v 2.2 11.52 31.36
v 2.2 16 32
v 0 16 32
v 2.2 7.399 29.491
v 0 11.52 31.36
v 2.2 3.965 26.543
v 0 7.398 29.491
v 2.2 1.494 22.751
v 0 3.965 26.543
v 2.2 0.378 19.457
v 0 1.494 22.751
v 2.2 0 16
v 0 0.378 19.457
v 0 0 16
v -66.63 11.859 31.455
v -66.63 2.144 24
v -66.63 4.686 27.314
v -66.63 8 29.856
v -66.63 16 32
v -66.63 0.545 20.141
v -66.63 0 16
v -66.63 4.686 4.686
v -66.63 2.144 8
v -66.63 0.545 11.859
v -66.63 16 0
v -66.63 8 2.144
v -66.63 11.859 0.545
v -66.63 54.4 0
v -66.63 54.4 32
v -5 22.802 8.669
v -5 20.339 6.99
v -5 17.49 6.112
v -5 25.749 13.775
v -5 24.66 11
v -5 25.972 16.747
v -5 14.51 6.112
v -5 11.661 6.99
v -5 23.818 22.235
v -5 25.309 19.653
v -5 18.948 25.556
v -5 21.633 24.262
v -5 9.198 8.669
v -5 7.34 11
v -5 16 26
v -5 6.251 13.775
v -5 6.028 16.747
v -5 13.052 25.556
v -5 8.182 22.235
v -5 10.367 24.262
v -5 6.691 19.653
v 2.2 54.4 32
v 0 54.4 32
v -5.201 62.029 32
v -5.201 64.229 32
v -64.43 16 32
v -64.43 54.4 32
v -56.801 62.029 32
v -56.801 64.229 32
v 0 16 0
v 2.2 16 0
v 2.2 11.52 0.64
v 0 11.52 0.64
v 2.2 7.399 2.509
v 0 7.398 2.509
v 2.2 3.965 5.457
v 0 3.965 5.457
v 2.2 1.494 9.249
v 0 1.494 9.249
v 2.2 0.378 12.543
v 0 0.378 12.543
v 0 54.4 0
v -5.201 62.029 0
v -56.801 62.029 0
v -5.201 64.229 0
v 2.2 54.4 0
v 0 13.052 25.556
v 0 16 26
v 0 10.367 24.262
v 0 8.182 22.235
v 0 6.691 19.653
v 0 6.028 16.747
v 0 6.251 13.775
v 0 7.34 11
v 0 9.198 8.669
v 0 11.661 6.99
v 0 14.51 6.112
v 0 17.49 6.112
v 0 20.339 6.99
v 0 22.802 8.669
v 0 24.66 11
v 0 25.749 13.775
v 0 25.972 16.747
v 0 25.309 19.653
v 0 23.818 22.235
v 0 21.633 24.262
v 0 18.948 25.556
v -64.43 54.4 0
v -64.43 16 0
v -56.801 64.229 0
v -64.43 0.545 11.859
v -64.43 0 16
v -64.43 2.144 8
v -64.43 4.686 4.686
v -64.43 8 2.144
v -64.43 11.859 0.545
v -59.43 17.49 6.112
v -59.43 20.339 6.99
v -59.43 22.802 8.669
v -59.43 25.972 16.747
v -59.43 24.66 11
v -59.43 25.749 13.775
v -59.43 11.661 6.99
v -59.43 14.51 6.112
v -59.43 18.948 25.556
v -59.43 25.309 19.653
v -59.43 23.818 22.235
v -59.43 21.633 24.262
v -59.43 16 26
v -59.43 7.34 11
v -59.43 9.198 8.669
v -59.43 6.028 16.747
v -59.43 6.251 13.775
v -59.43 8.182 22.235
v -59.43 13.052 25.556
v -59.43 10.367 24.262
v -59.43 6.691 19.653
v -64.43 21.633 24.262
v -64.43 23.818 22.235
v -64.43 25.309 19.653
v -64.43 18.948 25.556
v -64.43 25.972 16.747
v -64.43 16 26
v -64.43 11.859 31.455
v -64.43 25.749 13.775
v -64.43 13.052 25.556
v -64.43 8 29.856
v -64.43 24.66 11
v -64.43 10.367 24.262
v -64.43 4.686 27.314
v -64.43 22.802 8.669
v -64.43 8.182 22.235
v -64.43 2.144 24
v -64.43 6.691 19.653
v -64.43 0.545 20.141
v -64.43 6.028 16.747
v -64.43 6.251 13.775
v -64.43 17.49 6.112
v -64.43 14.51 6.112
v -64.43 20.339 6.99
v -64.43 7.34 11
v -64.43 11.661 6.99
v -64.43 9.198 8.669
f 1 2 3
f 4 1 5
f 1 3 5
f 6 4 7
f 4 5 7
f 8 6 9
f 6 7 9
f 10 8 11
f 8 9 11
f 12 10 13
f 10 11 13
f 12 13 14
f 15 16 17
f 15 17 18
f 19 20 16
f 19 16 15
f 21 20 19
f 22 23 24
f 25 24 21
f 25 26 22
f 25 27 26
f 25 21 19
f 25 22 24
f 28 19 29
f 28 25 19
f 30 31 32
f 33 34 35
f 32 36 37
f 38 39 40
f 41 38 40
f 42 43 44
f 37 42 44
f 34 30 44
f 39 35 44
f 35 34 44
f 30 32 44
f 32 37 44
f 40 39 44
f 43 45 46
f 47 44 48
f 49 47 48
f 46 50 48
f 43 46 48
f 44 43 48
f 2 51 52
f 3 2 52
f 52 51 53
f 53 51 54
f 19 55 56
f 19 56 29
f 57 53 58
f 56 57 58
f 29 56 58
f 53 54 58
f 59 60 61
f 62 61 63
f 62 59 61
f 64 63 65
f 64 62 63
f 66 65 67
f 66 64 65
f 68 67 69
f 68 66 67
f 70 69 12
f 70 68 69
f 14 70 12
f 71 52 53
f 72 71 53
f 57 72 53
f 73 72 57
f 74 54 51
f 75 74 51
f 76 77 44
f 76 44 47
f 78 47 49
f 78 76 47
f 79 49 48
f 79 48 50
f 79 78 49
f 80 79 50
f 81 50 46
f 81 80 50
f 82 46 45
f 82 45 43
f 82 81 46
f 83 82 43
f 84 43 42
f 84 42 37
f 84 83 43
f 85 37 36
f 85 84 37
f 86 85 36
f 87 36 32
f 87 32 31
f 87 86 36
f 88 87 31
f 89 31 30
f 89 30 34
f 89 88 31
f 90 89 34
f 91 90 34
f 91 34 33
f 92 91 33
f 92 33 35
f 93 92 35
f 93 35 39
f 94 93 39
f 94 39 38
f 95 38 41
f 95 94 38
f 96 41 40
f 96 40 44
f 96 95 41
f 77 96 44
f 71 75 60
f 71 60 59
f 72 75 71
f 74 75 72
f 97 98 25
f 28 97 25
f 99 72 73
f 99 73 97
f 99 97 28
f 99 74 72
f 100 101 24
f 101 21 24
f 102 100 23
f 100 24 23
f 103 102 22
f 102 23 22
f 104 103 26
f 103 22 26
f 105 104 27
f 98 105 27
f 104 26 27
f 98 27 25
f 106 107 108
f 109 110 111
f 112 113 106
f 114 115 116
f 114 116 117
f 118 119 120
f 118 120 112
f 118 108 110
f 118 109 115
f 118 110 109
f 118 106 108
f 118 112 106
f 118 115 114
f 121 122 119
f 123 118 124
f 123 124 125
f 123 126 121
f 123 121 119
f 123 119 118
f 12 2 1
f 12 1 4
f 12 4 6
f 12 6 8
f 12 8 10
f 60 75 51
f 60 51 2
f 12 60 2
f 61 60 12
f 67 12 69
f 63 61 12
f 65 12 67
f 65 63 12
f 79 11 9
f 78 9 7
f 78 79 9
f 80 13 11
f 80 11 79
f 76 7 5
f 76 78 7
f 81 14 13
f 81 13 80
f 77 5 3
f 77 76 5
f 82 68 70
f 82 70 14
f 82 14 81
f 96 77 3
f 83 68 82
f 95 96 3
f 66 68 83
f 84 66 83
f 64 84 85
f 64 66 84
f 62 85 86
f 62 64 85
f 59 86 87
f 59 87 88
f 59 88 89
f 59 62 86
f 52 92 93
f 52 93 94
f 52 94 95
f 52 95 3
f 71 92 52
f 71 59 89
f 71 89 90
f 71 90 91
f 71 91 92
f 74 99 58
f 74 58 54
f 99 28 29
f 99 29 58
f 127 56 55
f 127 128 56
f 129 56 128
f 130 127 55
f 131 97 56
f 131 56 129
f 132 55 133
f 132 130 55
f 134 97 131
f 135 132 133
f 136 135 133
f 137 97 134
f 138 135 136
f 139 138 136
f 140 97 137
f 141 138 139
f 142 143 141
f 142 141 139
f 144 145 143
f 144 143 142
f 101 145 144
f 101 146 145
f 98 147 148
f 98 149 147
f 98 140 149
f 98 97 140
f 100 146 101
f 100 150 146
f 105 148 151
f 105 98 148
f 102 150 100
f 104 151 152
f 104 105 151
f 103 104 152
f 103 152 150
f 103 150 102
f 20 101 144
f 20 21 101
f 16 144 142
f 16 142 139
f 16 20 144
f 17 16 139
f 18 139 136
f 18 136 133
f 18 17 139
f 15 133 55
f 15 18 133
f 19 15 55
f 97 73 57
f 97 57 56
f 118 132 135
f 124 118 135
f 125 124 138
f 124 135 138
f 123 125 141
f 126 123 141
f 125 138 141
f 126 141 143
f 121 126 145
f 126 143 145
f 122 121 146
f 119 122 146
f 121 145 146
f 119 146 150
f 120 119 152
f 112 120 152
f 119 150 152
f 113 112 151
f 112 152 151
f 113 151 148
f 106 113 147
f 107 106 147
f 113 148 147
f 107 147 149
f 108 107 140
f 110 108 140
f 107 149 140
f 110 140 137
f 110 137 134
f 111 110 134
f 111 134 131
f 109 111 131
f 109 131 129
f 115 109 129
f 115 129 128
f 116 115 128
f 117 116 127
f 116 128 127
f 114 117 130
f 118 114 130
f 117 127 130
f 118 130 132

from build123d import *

# Parameters (mm, degrees)
BOSS_EXTRUDE1_DEPTH = 32
FILLET1_R           = 16
FILLET2_R           = 16
SKETCH2_R           = 10
BOSS_EXTRUDE2_DEPTH = 5


with BuildPart() as part:
    # Sketch1 → Boss-Extrude1 (new body)
    with BuildSketch(Plane.XY):
        Polygon((0, 0), (0, 54.4), (-5.201179862, 62.028885271), (-56.801179862, 62.028885271), (-64.430065133, 54.4), (-64.430065133, 0), (-66.630065133, 0), (-66.630065133, 54.4), (-56.801179862, 64.228885271), (-5.201179862, 64.228885271), (2.2, 54.4), (2.2, 0.000275755), align=None)
    extrude(amount=BOSS_EXTRUDE1_DEPTH)

    # Fillet1
    fillet1_edges = [part.edges().sort_by_distance(p)[0] for p in [
        (-65.530065133, 0, 0),
        (-65.530065133, 0, 32),
    ]]
    fillet(fillet1_edges, radius=FILLET1_R - 0.0001)  # a hair under: the kernel refuses the full size

    # Fillet2
    fillet2_edges = [part.edges().sort_by_distance(p)[0] for p in [
        (1.1, 0.000137878, 32),
        (1.1, 0.000137878, 0),
    ]]
    fillet(fillet2_edges, radius=FILLET2_R - 0.0001)  # a hair under: the kernel refuses the full size

    # Sketch2 → Boss-Extrude2 (add)
    with BuildSketch(Plane(origin=(-64.430065133, 0, 0), x_dir=(0, 0, -1), z_dir=(1, 0, 0))):
        with Locations(Location((-16, 16, 0), (0, 0, 180))):
            Circle(SKETCH2_R)
    boss_extrude2 = extrude(amount=BOSS_EXTRUDE2_DEPTH)

    # Mirror1: Boss-Extrude2 across plane
    add(boss_extrude2.mirror(Plane(origin=(-32.215032567, 0, 0), x_dir=(0, 0, 1), z_dir=(1, 0, 0))))


solid = part.part
